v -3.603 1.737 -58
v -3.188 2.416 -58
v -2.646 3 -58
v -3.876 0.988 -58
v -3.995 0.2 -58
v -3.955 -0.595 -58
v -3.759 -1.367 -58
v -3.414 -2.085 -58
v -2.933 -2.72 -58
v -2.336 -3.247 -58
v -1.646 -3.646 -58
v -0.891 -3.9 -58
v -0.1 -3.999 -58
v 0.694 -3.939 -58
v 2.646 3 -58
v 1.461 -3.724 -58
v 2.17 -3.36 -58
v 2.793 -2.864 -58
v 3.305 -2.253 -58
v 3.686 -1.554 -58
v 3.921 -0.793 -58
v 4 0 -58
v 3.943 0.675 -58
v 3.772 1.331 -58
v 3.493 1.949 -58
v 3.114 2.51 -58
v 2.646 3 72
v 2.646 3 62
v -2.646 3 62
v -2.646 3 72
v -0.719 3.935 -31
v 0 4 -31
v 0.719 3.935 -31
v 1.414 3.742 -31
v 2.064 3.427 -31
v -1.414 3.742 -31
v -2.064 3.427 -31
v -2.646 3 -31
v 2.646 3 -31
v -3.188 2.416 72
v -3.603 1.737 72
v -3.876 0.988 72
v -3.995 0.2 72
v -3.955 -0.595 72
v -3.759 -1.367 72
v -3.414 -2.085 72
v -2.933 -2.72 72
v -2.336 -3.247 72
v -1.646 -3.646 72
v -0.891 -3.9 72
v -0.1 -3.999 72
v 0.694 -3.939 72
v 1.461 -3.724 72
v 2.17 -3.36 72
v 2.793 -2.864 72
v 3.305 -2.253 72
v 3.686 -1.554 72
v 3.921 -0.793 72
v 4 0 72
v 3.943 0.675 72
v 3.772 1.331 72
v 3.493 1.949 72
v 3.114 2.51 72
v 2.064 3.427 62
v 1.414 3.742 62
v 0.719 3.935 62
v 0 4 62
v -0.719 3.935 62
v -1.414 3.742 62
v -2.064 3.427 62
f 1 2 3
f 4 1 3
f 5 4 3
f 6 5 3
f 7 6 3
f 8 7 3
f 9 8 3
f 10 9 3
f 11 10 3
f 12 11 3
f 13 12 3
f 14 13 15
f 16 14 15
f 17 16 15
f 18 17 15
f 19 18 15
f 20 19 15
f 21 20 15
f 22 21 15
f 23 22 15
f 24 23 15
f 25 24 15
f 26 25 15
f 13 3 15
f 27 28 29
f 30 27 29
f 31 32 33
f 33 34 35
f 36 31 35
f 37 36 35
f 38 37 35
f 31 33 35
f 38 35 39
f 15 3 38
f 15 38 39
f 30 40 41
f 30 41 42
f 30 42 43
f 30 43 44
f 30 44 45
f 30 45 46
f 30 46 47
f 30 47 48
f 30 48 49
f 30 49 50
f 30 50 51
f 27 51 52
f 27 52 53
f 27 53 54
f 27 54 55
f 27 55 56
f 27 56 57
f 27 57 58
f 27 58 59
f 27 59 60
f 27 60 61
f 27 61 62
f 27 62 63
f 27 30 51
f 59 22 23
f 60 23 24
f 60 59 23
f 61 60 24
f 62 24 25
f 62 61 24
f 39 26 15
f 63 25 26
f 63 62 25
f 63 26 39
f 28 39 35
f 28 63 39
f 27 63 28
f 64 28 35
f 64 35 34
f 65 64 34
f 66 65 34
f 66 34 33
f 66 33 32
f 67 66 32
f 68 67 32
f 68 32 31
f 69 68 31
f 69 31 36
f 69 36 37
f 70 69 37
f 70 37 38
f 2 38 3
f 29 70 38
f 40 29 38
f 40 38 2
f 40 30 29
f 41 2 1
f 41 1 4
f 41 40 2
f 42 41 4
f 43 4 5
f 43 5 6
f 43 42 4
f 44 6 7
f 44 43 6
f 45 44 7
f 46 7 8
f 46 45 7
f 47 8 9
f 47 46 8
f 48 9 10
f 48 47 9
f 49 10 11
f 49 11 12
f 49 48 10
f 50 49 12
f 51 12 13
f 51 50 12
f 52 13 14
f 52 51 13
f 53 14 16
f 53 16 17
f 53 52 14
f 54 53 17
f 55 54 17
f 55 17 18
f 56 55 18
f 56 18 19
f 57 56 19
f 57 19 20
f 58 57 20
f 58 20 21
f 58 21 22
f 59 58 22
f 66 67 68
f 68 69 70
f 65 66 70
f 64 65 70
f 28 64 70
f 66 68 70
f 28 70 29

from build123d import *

# Parameters (mm, degrees)
ESBO_O1_R                     = 4
RESSALTO_EXTRUS_O1_DEPTH      = 72
RESSALTO_EXTRUS_O1_DEPTH_BACK = 58
CORTE_EXTRUS_O1_DEPTH         = 10
CORTE_EXTRUS_O2_DEPTH         = 27


with BuildPart() as part:
    # Esboço1 → Ressalto-extrusão1 (new body, two sides)
    with BuildSketch(Plane.XY) as ressalto_extrus_o1_sk:
        Circle(ESBO_O1_R)
    extrude(amount=RESSALTO_EXTRUS_O1_DEPTH)
    extrude(ressalto_extrus_o1_sk.sketch, amount=-RESSALTO_EXTRUS_O1_DEPTH_BACK)

    # Esboço2 → Corte-extrusão1 (cut)
    with BuildSketch(Plane.XY.offset(72)):
        with BuildLine():
            Line((2.645751311, 3), (-2.645751311, 3))
            ThreePointArc((-2.645751311, 3), (0, 4), (2.645751311, 3))
        make_face()
    extrude(amount=-CORTE_EXTRUS_O1_DEPTH, mode=Mode.SUBTRACT)

    # Esboço6 → Corte-extrusão2 (cut)
    with BuildSketch(Plane(origin=(0, 0, -58), x_dir=(-1, 0, 0), z_dir=(0, 0, -1))):
        with BuildLine():
            Line((2.645751311, 3), (-2.645751311, 3))
            ThreePointArc((-2.645751311, 3), (0, 4), (2.645751311, 3))
        make_face()
    extrude(amount=-CORTE_EXTRUS_O2_DEPTH, mode=Mode.SUBTRACT)


solid = part.part
